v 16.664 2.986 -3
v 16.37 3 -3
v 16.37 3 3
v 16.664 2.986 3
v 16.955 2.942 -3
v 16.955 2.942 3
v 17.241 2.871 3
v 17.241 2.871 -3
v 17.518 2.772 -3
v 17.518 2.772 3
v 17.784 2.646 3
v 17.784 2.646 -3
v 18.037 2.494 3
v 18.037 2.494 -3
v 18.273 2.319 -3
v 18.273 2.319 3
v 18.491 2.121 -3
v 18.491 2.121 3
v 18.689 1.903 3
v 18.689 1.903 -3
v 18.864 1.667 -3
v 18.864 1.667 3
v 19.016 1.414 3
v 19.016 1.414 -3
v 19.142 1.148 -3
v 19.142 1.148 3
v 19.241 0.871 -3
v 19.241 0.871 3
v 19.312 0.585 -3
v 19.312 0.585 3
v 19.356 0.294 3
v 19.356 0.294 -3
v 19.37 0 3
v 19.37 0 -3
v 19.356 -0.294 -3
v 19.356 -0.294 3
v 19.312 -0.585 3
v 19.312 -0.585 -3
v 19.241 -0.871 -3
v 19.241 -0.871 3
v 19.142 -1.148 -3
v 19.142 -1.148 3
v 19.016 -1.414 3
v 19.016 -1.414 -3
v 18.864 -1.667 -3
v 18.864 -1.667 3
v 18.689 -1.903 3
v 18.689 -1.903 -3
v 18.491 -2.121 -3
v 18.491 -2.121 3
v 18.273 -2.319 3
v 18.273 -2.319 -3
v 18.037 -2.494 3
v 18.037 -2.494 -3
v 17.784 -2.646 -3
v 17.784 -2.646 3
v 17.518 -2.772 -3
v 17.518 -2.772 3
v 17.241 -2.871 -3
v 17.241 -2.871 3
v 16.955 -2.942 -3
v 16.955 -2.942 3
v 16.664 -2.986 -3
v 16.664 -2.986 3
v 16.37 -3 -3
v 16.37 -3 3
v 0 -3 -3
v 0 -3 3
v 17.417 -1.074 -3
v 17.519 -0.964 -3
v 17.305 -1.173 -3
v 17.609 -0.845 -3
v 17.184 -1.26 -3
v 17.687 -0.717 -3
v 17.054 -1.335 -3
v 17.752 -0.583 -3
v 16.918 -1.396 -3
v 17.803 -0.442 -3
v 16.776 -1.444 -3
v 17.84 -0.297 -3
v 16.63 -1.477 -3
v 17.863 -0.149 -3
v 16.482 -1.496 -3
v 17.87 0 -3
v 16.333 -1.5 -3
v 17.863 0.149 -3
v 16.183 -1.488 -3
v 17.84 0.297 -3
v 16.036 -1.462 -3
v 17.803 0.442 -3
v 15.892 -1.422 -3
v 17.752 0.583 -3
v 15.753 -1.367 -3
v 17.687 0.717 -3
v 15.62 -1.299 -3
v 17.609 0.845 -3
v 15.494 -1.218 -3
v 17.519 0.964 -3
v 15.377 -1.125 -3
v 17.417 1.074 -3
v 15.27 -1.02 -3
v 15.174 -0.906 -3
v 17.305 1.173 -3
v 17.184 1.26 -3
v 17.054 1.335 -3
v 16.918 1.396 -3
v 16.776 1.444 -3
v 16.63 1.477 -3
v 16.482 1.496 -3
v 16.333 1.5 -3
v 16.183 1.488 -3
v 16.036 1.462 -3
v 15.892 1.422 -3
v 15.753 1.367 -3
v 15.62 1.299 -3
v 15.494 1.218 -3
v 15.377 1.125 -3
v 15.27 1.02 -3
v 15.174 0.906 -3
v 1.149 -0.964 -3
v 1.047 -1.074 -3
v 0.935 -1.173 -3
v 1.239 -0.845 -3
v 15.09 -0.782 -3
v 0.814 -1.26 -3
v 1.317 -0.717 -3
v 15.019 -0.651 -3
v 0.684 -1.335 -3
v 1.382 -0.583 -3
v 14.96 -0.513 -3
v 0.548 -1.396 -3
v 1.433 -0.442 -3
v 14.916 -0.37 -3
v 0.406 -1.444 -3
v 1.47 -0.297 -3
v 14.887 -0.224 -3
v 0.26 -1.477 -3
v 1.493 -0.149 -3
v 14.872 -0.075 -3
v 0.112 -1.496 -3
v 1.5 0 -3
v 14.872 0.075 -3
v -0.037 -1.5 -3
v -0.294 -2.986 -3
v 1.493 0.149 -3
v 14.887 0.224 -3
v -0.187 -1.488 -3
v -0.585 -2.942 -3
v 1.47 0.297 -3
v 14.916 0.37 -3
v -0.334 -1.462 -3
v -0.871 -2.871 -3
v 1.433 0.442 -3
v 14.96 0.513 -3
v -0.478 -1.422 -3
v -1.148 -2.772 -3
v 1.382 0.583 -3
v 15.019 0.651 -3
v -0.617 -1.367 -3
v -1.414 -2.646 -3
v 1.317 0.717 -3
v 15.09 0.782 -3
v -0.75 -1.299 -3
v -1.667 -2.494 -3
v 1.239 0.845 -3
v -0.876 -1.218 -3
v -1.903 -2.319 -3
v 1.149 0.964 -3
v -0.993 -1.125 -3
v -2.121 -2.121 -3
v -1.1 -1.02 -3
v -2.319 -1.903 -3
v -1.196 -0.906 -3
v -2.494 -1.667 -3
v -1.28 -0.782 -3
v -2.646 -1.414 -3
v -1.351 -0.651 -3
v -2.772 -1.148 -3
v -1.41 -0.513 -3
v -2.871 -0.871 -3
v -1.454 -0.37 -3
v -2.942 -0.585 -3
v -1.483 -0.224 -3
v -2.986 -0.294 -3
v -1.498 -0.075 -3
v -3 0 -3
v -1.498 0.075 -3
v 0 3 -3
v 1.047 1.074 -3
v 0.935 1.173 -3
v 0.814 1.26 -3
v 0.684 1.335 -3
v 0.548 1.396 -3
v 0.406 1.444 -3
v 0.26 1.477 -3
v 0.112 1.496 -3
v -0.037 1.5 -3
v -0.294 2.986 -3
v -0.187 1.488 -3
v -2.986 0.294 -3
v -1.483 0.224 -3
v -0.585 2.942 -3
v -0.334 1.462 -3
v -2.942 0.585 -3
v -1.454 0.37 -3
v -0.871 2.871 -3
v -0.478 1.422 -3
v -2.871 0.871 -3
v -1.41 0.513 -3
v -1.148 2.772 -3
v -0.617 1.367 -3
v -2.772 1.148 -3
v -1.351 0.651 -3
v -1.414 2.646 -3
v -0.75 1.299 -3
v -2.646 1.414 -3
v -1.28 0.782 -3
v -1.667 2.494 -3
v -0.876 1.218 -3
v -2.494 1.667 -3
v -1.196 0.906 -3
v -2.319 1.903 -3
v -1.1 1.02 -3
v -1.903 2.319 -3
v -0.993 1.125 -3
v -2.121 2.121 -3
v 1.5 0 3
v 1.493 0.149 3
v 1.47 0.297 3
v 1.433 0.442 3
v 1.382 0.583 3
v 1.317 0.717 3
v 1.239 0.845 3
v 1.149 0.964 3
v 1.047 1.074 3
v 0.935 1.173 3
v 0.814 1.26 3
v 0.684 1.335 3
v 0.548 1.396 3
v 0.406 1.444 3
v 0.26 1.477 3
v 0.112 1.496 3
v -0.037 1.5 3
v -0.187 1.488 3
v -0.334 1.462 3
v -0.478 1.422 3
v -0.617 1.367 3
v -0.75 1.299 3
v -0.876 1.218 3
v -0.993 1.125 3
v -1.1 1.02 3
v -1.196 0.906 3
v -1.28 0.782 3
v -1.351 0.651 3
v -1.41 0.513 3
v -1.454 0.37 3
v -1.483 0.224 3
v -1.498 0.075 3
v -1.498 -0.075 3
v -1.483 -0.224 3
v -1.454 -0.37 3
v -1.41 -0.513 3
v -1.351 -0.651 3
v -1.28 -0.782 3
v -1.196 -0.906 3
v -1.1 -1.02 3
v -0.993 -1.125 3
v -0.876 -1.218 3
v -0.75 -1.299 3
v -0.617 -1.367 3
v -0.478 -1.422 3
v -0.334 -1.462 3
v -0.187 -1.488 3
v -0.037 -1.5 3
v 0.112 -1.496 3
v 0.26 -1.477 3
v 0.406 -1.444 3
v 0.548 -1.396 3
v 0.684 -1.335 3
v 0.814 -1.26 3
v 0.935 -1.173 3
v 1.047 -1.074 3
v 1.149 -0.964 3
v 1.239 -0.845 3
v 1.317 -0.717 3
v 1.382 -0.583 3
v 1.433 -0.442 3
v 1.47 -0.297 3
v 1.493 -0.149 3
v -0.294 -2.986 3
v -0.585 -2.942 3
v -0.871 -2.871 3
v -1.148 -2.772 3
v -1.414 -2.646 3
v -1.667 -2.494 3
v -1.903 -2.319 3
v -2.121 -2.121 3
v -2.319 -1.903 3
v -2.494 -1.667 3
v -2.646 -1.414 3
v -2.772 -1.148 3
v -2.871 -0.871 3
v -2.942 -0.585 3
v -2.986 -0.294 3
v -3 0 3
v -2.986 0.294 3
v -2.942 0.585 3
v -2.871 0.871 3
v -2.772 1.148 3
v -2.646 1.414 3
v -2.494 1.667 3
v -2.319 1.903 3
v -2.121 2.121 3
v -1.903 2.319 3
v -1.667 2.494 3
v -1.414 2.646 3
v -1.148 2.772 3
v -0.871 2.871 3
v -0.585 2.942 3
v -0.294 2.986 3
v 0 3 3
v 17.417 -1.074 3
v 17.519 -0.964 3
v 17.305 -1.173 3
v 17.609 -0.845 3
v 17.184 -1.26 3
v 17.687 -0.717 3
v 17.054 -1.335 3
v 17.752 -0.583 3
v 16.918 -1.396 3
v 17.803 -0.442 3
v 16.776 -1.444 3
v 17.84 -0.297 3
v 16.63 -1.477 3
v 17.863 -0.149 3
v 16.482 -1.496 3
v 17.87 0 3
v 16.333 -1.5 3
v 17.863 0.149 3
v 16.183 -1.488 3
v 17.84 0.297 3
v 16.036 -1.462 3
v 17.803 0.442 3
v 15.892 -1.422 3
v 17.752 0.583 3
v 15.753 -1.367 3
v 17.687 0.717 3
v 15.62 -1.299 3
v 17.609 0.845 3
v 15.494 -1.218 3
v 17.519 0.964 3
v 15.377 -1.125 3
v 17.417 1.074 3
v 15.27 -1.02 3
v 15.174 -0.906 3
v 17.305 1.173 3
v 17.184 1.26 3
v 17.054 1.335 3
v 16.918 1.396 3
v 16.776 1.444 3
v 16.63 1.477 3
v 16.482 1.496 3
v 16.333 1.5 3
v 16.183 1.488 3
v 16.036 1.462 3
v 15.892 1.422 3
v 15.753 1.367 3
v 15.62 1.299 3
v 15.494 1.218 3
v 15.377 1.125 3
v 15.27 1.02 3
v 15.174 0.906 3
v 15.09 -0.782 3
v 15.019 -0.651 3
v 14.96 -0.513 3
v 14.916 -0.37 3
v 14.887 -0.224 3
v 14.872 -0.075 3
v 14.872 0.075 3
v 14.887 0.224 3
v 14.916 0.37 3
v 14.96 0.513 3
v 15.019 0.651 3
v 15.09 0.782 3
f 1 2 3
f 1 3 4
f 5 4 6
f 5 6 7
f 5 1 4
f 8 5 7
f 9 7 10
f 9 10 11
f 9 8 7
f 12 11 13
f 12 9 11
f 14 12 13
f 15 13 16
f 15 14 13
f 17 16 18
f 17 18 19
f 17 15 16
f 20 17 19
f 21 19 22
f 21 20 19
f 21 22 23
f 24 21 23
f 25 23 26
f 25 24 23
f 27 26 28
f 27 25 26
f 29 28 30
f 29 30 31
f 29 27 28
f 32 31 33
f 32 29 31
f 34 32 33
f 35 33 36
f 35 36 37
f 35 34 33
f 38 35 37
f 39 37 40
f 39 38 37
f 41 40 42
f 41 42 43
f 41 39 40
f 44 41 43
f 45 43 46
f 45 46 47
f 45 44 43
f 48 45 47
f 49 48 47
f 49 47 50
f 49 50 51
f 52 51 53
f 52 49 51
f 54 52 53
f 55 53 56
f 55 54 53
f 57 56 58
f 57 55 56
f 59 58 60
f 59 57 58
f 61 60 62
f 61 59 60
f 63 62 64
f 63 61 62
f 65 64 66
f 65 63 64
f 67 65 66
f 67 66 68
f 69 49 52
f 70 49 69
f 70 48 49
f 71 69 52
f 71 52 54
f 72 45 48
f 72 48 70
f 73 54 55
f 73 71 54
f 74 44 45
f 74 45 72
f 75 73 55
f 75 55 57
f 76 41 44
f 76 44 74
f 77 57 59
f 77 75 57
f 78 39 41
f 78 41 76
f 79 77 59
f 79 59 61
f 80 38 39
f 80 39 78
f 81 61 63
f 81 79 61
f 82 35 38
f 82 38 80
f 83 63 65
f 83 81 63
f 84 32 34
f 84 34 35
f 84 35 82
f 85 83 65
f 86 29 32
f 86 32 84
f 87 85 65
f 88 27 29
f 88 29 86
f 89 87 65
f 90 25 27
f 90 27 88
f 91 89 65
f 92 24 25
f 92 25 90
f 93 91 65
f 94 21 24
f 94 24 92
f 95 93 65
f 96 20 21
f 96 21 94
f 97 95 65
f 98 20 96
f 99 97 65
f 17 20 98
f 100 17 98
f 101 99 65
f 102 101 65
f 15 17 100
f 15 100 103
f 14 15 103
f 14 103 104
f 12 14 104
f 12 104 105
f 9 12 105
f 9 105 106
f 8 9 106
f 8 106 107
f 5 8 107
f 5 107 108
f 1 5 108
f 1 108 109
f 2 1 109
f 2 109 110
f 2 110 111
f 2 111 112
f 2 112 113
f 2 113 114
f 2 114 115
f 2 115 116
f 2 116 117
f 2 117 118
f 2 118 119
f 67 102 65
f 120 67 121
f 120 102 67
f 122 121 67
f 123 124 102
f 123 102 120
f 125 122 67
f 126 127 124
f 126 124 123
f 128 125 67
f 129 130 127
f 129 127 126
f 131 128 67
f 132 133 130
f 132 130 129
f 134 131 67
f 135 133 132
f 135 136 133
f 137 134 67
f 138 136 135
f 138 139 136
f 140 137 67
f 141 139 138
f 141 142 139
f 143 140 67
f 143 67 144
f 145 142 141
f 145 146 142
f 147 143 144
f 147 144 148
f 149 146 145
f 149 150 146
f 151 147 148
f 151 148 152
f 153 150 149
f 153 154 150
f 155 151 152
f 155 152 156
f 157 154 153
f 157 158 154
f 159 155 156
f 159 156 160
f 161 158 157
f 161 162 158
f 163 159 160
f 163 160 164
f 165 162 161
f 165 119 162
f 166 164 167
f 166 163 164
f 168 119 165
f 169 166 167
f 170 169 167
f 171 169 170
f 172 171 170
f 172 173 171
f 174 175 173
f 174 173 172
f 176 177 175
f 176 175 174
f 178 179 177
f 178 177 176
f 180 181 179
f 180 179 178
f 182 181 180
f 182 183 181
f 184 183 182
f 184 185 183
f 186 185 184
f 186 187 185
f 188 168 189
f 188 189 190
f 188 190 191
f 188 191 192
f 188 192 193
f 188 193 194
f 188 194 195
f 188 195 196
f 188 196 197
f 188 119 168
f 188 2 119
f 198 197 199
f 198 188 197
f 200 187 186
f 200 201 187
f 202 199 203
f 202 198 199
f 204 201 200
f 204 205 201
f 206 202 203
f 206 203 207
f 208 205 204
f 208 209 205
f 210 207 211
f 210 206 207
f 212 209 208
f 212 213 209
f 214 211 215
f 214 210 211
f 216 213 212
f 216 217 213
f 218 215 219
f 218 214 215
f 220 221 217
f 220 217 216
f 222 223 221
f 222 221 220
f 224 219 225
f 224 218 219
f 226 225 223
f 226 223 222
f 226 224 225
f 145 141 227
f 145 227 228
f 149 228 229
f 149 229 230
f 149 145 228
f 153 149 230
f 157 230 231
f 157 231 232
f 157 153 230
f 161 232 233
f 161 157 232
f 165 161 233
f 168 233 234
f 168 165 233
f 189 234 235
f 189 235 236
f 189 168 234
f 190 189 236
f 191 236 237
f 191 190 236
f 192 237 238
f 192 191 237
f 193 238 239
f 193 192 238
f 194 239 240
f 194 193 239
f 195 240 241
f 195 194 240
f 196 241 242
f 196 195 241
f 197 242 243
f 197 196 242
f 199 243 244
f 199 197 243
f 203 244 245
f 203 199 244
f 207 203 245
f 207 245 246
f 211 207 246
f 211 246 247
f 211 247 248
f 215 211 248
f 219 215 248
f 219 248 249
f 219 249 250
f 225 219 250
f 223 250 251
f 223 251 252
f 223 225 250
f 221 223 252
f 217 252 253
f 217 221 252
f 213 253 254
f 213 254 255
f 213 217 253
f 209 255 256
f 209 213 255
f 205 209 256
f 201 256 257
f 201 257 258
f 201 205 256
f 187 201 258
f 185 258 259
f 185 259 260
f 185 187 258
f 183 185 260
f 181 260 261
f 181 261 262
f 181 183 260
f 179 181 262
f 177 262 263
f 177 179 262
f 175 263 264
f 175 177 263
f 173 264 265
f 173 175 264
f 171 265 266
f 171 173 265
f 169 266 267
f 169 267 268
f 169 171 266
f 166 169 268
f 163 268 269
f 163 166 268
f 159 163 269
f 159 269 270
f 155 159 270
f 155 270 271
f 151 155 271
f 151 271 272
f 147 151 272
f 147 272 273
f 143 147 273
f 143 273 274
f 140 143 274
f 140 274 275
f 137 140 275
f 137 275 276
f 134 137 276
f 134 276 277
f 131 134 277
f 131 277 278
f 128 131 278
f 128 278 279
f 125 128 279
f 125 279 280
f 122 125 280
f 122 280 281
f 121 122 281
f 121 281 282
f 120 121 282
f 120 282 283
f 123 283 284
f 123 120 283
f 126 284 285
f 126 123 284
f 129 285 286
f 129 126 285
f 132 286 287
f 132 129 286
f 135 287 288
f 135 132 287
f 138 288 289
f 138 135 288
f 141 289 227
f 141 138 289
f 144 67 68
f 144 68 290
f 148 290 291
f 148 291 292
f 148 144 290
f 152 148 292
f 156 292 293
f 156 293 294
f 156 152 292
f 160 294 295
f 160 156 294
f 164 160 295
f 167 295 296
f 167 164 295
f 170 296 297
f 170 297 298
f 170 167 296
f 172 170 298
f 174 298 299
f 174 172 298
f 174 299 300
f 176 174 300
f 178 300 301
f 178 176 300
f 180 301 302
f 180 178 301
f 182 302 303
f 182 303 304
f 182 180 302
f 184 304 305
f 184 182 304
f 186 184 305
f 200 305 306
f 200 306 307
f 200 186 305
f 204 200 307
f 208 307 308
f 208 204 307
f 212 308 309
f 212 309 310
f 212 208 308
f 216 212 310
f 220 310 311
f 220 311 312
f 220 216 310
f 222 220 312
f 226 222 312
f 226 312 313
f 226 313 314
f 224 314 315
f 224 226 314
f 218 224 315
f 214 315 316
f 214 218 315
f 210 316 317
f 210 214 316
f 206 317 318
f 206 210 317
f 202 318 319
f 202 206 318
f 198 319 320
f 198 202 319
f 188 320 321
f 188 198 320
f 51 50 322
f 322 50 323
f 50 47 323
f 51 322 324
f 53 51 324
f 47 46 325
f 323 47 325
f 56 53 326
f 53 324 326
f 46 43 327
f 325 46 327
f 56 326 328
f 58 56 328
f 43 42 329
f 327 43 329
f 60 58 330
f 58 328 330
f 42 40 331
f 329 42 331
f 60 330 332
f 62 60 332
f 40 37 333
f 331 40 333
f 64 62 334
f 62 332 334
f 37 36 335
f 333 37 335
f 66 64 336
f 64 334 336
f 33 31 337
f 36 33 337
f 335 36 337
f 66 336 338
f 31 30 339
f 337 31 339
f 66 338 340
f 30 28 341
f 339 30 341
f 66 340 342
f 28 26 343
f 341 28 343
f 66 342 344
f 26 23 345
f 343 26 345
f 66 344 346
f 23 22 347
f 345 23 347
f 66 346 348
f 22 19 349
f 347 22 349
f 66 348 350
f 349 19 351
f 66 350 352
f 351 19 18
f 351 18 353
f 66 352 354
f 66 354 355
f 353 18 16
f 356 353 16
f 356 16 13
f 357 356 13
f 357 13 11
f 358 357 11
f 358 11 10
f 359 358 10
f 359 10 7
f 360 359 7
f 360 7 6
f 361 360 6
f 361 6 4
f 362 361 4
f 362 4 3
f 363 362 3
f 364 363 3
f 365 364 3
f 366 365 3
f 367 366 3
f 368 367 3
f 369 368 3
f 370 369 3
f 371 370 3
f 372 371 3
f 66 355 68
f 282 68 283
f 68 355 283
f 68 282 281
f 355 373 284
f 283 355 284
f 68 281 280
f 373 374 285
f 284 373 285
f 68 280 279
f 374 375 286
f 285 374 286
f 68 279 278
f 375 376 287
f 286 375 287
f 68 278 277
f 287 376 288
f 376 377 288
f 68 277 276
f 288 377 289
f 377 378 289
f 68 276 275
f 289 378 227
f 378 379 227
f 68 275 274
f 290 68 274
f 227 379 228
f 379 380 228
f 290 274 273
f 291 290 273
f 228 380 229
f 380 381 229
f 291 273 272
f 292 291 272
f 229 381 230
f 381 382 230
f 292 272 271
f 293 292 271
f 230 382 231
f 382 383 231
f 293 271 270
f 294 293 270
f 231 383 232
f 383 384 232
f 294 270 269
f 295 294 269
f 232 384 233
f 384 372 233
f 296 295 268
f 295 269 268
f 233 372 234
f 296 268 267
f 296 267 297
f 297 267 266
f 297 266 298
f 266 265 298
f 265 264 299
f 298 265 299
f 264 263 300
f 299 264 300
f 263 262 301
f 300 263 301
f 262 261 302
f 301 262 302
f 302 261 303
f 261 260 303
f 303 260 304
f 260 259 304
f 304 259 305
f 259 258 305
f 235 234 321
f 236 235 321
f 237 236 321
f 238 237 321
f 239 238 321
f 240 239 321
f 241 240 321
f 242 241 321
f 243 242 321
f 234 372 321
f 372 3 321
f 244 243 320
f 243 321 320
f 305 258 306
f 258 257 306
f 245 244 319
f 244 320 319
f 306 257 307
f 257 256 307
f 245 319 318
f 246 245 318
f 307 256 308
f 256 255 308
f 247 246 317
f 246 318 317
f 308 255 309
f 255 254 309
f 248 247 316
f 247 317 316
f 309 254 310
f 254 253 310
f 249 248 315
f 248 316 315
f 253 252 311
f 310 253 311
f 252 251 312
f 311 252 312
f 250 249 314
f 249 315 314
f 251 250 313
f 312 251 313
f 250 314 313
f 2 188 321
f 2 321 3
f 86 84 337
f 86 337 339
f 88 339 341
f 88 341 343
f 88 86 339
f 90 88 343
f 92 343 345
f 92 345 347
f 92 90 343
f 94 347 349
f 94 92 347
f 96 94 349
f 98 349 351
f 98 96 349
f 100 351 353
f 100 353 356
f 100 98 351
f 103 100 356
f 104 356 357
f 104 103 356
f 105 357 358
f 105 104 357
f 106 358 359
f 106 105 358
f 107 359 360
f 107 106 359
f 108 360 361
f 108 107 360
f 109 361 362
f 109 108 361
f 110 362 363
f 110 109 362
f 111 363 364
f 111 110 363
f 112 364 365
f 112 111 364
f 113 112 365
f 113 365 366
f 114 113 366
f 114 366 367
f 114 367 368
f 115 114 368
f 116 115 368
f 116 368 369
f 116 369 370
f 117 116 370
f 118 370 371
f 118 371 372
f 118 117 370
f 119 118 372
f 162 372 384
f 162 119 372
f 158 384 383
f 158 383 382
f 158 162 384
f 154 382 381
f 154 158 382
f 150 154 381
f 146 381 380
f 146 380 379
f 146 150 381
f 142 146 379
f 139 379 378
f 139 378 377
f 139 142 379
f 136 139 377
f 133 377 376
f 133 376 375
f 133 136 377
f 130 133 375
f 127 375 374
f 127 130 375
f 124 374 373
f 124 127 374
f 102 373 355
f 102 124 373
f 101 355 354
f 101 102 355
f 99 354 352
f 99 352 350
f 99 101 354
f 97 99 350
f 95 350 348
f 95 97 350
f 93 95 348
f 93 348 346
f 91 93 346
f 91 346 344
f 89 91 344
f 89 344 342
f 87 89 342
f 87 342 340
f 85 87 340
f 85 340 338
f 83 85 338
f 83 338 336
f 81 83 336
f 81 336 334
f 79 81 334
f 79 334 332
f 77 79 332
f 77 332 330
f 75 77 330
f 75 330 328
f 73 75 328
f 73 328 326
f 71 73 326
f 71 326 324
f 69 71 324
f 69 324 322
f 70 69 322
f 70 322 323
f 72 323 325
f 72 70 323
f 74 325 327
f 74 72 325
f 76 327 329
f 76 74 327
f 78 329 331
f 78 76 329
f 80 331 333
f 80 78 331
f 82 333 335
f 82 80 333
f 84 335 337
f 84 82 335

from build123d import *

# Parameters (mm, degrees)
BOSS_EXTRU_1_DEPTH      = 3
BOSS_EXTRU_1_DEPTH_BACK = 3
ESQUISSE1_R             = 1.5


with BuildPart() as part:
    # Esquisse1 → Boss.-Extru.1 (new, two sides: drawn at the far end of the back side and taken through both)
    with BuildSketch(Plane.XY.offset(-BOSS_EXTRU_1_DEPTH_BACK)):
        with BuildLine():
            Line((0, 3), (16.37, 3))
            ThreePointArc((16.37, 3), (19.37, 0), (16.37, -3))
            Line((16.37, -3), (0, -3))
            ThreePointArc((0, -3), (-3, 0), (0, 3))
        make_face()
        Circle(ESQUISSE1_R, mode=Mode.SUBTRACT)
        with Locations((16.37, 0)):
            Circle(ESQUISSE1_R, mode=Mode.SUBTRACT)
    extrude(amount=BOSS_EXTRU_1_DEPTH + BOSS_EXTRU_1_DEPTH_BACK)


solid = part.part
